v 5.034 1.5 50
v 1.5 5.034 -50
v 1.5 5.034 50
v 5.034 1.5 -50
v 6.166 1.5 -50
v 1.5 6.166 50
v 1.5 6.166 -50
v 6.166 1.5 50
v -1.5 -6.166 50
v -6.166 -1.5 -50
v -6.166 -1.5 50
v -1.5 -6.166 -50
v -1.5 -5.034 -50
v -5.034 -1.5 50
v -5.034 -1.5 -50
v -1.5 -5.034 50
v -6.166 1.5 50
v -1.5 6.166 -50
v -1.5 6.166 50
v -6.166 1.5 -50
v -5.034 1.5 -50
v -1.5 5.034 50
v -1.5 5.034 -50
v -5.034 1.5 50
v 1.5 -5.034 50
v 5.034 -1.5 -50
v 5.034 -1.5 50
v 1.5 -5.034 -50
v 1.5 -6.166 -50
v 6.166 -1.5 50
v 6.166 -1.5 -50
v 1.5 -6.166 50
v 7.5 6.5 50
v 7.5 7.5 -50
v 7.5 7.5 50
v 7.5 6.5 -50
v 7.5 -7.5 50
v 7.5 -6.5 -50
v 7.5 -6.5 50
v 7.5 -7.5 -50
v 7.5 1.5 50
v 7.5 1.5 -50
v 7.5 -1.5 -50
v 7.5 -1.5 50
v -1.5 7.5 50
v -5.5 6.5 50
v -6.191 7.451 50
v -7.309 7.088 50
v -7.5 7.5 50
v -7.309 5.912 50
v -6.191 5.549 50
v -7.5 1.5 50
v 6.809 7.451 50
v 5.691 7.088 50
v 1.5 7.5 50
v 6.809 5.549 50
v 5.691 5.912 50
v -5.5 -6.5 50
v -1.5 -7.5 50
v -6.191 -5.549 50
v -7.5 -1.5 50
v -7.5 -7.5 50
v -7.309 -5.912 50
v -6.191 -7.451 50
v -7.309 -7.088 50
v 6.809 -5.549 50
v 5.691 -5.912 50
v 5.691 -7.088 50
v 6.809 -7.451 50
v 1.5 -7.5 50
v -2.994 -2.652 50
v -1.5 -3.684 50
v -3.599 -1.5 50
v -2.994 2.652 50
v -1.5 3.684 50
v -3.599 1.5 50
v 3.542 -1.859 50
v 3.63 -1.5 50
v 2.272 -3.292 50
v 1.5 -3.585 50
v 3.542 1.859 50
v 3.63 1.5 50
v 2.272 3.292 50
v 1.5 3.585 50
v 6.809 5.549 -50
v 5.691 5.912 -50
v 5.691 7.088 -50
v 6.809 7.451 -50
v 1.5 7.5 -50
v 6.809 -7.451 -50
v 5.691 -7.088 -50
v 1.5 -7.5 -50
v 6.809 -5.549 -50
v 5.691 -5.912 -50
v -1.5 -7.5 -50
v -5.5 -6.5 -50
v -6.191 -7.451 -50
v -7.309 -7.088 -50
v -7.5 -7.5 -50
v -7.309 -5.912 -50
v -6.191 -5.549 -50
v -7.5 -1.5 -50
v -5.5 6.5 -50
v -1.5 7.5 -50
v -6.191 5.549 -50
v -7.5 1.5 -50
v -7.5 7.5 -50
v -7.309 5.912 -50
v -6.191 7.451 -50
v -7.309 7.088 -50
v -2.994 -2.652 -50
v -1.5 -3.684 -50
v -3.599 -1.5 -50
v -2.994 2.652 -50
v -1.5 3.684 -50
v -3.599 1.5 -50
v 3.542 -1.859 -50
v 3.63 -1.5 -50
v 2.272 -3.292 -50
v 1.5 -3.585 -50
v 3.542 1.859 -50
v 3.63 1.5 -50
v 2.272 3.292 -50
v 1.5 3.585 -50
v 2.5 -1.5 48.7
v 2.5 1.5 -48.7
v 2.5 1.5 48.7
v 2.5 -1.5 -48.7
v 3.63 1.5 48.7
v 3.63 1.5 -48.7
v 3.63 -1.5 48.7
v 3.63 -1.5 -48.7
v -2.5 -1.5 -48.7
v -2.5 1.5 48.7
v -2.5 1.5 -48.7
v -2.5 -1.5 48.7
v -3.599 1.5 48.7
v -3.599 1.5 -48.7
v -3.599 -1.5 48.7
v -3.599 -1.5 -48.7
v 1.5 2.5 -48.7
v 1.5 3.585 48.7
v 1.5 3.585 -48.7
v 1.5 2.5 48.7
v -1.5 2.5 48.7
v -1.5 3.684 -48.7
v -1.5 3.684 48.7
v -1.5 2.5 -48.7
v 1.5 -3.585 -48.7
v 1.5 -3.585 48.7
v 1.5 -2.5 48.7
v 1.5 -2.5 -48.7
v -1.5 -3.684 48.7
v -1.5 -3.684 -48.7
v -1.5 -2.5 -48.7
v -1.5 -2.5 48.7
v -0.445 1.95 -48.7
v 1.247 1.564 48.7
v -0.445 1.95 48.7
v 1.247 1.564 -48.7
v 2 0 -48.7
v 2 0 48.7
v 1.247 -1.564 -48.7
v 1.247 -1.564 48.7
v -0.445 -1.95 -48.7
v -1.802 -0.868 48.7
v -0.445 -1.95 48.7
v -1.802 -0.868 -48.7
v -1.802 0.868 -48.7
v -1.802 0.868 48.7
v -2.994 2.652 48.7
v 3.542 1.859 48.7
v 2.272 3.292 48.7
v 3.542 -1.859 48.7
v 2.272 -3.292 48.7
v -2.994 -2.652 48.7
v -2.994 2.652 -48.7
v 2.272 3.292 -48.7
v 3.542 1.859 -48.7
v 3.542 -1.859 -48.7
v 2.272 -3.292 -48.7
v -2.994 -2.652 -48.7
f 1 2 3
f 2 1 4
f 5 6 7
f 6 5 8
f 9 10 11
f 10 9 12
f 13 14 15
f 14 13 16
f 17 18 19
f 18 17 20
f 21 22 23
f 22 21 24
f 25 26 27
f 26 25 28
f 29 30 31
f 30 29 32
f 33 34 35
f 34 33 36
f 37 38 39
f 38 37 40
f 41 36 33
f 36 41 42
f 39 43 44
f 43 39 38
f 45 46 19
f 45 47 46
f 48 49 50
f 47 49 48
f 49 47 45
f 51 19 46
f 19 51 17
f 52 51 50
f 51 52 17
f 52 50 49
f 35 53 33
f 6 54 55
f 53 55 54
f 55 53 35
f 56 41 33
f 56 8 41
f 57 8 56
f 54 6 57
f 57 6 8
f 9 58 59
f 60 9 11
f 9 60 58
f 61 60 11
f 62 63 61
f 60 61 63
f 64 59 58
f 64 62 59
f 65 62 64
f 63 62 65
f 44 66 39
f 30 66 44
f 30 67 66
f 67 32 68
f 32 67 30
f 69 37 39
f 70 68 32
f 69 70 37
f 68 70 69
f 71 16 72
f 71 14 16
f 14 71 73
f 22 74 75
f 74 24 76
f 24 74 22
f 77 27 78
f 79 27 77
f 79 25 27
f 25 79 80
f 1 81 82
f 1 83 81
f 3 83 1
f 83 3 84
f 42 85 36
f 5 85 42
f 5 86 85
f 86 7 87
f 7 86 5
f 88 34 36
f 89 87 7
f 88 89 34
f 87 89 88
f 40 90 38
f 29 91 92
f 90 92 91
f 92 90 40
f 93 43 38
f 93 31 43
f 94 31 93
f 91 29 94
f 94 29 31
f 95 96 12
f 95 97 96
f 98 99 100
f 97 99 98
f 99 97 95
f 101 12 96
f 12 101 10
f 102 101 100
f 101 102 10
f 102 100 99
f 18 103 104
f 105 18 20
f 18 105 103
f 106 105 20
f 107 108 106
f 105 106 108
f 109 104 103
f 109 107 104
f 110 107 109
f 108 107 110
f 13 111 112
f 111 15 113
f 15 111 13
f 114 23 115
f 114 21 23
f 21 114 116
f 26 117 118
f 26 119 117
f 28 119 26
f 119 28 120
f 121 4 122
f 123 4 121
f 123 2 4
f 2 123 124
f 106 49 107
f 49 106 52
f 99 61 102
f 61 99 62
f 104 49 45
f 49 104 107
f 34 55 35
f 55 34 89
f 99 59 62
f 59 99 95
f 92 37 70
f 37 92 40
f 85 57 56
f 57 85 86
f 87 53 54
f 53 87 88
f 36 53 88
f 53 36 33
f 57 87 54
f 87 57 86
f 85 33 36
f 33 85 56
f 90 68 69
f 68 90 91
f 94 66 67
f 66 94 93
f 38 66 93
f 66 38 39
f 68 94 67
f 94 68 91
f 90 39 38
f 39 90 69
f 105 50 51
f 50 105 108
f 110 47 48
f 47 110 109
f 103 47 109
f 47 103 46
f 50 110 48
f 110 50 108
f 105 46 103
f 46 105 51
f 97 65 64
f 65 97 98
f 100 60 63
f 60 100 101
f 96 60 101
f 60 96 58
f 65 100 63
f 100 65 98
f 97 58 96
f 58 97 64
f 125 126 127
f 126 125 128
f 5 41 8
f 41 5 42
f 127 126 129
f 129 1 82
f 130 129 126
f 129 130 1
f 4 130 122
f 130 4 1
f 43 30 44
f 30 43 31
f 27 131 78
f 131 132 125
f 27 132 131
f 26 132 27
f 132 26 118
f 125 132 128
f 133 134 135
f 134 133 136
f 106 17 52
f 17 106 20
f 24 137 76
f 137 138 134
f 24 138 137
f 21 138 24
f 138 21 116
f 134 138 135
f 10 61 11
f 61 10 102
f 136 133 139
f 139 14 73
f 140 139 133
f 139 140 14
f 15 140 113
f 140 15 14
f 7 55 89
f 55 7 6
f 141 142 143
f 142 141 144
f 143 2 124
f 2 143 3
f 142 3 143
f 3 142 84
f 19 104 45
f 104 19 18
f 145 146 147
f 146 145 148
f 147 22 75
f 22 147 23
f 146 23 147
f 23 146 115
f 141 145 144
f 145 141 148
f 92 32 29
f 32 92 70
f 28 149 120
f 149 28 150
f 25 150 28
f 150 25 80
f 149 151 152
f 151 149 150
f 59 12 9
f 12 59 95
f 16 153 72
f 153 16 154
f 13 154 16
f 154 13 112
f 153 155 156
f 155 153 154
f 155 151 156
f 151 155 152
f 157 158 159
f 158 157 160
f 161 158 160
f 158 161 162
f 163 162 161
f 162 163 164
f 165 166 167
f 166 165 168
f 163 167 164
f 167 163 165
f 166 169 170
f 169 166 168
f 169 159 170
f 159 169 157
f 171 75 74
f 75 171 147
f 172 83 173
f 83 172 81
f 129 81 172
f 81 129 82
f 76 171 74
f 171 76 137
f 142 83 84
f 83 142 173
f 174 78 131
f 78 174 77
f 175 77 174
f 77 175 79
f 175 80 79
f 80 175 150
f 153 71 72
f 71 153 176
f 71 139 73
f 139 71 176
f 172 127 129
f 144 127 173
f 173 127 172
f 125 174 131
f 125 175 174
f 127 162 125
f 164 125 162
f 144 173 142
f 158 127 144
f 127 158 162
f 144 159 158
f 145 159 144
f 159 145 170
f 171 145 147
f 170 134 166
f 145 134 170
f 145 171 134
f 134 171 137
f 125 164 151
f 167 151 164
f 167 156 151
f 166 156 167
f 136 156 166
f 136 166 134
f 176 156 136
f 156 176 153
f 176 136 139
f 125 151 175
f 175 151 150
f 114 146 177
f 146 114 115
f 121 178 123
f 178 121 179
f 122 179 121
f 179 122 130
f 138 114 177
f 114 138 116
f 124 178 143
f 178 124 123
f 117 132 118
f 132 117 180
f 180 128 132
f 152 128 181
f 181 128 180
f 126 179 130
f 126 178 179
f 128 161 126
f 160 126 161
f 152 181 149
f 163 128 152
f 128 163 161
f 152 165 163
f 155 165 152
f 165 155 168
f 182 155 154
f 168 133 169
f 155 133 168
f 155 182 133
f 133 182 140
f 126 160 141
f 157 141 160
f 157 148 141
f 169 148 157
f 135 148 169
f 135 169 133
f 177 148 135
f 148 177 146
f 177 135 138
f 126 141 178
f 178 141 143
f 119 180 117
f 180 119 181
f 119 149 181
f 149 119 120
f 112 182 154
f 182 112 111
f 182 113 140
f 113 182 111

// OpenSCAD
// Parameters
profile_W = 15.0; //[7.5:30.0:0.1]
profile_H = 15.0; //[7.5:30.0:0.1]
length_L = 100.0; //[50.0:200.0:1]
chamfer_C = 0.8; //[0.4:1.6:0.1]
fillet_R = 1.0; //[0.5:2.0:0.1]
slot_W = 3.0; //[1.5:6.0:0.1]
slot_depth = 4.0; //[2.0:8.0:0.1]
center_bore_R = 2.0; //[1.0:4.0:0.1]
mark_depth = 0.3; //[0.1:0.8:0.05]
mark_R = 4.0; //[2.0:7.0:0.1]
overlap_eps = 1.0; //[0.5:2.0:0.1]

// Base Shapes
module extrusion_body() {
  cube([profile_W, profile_H, length_L], center=true);
}

module edge_chamfer_wedge_xpos() {
  translate([profile_W/2 - chamfer_C/2, 0, 0])
    rotate([0, 0, 45])
      cube([chamfer_C, profile_H + 2*overlap_eps, length_L + 2*overlap_eps], center=true);
}

module edge_chamfer_wedge_xneg() {
  translate([-profile_W/2 + chamfer_C/2, 0, 0])
    rotate([0, 0, 45])
      cube([chamfer_C, profile_H + 2*overlap_eps, length_L + 2*overlap_eps], center=true);
}

module edge_chamfer_wedge_ypos() {
  translate([0, profile_H/2 - chamfer_C/2, 0])
    rotate([0, 0, 45])
      cube([profile_W + 2*overlap_eps, chamfer_C, length_L + 2*overlap_eps], center=true);
}

module edge_chamfer_wedge_yneg() {
  translate([0, -profile_H/2 + chamfer_C/2, 0])
    rotate([0, 0, 45])
      cube([profile_W + 2*overlap_eps, chamfer_C, length_L + 2*overlap_eps], center=true);
}

module corner_fillet_cyl_pp() {
  translate([profile_W/2 - fillet_R, profile_H/2 - fillet_R, 0])
    cylinder(r=fillet_R, h=length_L + 2*overlap_eps, center=true);
}

module corner_fillet_cyl_pn() {
  translate([profile_W/2 - fillet_R, -profile_H/2 + fillet_R, 0])
    cylinder(r=fillet_R, h=length_L + 2*overlap_eps, center=true);
}

module corner_fillet_cyl_np() {
  translate([-profile_W/2 + fillet_R, profile_H/2 - fillet_R, 0])
    cylinder(r=fillet_R, h=length_L + 2*overlap_eps, center=true);
}

module corner_fillet_cyl_nn() {
  translate([-profile_W/2 + fillet_R, -profile_H/2 + fillet_R, 0])
    cylinder(r=fillet_R, h=length_L + 2*overlap_eps, center=true);
}

module internal_slot_xpos() {
  translate([profile_W/2 - (slot_depth + overlap_eps)/2, 0, 0])
    cube([slot_depth + overlap_eps, slot_W, length_L + 2*overlap_eps], center=true);
}

module internal_slot_xneg() {
  translate([-profile_W/2 + (slot_depth + overlap_eps)/2, 0, 0])
    cube([slot_depth + overlap_eps, slot_W, length_L + 2*overlap_eps], center=true);
}

module internal_slot_ypos() {
  translate([0, profile_H/2 - (slot_depth + overlap_eps)/2, 0])
    cube([slot_W, slot_depth + overlap_eps, length_L + 2*overlap_eps], center=true);
}

module internal_slot_yneg() {
  translate([0, -profile_H/2 + (slot_depth + overlap_eps)/2, 0])
    cube([slot_W, slot_depth + overlap_eps, length_L + 2*overlap_eps], center=true);
}

module internal_center_bore() {
  cylinder(r=center_bore_R, h=length_L + 2*overlap_eps, center=true);
}

module end_face_marking_pos() {
  translate([0, 0, length_L/2 - (mark_depth + overlap_eps)/2])
    cylinder(r=mark_R, h=mark_depth + overlap_eps, center=true);
}

module end_face_marking_neg() {
  translate([0, 0, -length_L/2 + (mark_depth + overlap_eps)/2])
    cylinder(r=mark_R, h=mark_depth + overlap_eps, center=true);
}

// Operations
module edge_chamfers() {
  union() {
    edge_chamfer_wedge_xpos();
    edge_chamfer_wedge_xneg();
    edge_chamfer_wedge_ypos();
    edge_chamfer_wedge_yneg();
  }
}

module corner_fillets() {
  union() {
    corner_fillet_cyl_pp();
    corner_fillet_cyl_pn();
    corner_fillet_cyl_np();
    corner_fillet_cyl_nn();
  }
}

module internal_profile_details() {
  union() {
    internal_slot_xpos();
    internal_slot_xneg();
    internal_slot_ypos();
    internal_slot_yneg();
    internal_center_bore();
  }
}

module end_face_markings() {
  union() {
    end_face_marking_pos();
    end_face_marking_neg();
  }
}

// Complete Model
difference() {
  difference() {
    difference() {
      difference() {
        extrusion_body();
        edge_chamfers();
      }
      corner_fillets();
    }
    internal_profile_details();
  }
  end_face_markings();
}
